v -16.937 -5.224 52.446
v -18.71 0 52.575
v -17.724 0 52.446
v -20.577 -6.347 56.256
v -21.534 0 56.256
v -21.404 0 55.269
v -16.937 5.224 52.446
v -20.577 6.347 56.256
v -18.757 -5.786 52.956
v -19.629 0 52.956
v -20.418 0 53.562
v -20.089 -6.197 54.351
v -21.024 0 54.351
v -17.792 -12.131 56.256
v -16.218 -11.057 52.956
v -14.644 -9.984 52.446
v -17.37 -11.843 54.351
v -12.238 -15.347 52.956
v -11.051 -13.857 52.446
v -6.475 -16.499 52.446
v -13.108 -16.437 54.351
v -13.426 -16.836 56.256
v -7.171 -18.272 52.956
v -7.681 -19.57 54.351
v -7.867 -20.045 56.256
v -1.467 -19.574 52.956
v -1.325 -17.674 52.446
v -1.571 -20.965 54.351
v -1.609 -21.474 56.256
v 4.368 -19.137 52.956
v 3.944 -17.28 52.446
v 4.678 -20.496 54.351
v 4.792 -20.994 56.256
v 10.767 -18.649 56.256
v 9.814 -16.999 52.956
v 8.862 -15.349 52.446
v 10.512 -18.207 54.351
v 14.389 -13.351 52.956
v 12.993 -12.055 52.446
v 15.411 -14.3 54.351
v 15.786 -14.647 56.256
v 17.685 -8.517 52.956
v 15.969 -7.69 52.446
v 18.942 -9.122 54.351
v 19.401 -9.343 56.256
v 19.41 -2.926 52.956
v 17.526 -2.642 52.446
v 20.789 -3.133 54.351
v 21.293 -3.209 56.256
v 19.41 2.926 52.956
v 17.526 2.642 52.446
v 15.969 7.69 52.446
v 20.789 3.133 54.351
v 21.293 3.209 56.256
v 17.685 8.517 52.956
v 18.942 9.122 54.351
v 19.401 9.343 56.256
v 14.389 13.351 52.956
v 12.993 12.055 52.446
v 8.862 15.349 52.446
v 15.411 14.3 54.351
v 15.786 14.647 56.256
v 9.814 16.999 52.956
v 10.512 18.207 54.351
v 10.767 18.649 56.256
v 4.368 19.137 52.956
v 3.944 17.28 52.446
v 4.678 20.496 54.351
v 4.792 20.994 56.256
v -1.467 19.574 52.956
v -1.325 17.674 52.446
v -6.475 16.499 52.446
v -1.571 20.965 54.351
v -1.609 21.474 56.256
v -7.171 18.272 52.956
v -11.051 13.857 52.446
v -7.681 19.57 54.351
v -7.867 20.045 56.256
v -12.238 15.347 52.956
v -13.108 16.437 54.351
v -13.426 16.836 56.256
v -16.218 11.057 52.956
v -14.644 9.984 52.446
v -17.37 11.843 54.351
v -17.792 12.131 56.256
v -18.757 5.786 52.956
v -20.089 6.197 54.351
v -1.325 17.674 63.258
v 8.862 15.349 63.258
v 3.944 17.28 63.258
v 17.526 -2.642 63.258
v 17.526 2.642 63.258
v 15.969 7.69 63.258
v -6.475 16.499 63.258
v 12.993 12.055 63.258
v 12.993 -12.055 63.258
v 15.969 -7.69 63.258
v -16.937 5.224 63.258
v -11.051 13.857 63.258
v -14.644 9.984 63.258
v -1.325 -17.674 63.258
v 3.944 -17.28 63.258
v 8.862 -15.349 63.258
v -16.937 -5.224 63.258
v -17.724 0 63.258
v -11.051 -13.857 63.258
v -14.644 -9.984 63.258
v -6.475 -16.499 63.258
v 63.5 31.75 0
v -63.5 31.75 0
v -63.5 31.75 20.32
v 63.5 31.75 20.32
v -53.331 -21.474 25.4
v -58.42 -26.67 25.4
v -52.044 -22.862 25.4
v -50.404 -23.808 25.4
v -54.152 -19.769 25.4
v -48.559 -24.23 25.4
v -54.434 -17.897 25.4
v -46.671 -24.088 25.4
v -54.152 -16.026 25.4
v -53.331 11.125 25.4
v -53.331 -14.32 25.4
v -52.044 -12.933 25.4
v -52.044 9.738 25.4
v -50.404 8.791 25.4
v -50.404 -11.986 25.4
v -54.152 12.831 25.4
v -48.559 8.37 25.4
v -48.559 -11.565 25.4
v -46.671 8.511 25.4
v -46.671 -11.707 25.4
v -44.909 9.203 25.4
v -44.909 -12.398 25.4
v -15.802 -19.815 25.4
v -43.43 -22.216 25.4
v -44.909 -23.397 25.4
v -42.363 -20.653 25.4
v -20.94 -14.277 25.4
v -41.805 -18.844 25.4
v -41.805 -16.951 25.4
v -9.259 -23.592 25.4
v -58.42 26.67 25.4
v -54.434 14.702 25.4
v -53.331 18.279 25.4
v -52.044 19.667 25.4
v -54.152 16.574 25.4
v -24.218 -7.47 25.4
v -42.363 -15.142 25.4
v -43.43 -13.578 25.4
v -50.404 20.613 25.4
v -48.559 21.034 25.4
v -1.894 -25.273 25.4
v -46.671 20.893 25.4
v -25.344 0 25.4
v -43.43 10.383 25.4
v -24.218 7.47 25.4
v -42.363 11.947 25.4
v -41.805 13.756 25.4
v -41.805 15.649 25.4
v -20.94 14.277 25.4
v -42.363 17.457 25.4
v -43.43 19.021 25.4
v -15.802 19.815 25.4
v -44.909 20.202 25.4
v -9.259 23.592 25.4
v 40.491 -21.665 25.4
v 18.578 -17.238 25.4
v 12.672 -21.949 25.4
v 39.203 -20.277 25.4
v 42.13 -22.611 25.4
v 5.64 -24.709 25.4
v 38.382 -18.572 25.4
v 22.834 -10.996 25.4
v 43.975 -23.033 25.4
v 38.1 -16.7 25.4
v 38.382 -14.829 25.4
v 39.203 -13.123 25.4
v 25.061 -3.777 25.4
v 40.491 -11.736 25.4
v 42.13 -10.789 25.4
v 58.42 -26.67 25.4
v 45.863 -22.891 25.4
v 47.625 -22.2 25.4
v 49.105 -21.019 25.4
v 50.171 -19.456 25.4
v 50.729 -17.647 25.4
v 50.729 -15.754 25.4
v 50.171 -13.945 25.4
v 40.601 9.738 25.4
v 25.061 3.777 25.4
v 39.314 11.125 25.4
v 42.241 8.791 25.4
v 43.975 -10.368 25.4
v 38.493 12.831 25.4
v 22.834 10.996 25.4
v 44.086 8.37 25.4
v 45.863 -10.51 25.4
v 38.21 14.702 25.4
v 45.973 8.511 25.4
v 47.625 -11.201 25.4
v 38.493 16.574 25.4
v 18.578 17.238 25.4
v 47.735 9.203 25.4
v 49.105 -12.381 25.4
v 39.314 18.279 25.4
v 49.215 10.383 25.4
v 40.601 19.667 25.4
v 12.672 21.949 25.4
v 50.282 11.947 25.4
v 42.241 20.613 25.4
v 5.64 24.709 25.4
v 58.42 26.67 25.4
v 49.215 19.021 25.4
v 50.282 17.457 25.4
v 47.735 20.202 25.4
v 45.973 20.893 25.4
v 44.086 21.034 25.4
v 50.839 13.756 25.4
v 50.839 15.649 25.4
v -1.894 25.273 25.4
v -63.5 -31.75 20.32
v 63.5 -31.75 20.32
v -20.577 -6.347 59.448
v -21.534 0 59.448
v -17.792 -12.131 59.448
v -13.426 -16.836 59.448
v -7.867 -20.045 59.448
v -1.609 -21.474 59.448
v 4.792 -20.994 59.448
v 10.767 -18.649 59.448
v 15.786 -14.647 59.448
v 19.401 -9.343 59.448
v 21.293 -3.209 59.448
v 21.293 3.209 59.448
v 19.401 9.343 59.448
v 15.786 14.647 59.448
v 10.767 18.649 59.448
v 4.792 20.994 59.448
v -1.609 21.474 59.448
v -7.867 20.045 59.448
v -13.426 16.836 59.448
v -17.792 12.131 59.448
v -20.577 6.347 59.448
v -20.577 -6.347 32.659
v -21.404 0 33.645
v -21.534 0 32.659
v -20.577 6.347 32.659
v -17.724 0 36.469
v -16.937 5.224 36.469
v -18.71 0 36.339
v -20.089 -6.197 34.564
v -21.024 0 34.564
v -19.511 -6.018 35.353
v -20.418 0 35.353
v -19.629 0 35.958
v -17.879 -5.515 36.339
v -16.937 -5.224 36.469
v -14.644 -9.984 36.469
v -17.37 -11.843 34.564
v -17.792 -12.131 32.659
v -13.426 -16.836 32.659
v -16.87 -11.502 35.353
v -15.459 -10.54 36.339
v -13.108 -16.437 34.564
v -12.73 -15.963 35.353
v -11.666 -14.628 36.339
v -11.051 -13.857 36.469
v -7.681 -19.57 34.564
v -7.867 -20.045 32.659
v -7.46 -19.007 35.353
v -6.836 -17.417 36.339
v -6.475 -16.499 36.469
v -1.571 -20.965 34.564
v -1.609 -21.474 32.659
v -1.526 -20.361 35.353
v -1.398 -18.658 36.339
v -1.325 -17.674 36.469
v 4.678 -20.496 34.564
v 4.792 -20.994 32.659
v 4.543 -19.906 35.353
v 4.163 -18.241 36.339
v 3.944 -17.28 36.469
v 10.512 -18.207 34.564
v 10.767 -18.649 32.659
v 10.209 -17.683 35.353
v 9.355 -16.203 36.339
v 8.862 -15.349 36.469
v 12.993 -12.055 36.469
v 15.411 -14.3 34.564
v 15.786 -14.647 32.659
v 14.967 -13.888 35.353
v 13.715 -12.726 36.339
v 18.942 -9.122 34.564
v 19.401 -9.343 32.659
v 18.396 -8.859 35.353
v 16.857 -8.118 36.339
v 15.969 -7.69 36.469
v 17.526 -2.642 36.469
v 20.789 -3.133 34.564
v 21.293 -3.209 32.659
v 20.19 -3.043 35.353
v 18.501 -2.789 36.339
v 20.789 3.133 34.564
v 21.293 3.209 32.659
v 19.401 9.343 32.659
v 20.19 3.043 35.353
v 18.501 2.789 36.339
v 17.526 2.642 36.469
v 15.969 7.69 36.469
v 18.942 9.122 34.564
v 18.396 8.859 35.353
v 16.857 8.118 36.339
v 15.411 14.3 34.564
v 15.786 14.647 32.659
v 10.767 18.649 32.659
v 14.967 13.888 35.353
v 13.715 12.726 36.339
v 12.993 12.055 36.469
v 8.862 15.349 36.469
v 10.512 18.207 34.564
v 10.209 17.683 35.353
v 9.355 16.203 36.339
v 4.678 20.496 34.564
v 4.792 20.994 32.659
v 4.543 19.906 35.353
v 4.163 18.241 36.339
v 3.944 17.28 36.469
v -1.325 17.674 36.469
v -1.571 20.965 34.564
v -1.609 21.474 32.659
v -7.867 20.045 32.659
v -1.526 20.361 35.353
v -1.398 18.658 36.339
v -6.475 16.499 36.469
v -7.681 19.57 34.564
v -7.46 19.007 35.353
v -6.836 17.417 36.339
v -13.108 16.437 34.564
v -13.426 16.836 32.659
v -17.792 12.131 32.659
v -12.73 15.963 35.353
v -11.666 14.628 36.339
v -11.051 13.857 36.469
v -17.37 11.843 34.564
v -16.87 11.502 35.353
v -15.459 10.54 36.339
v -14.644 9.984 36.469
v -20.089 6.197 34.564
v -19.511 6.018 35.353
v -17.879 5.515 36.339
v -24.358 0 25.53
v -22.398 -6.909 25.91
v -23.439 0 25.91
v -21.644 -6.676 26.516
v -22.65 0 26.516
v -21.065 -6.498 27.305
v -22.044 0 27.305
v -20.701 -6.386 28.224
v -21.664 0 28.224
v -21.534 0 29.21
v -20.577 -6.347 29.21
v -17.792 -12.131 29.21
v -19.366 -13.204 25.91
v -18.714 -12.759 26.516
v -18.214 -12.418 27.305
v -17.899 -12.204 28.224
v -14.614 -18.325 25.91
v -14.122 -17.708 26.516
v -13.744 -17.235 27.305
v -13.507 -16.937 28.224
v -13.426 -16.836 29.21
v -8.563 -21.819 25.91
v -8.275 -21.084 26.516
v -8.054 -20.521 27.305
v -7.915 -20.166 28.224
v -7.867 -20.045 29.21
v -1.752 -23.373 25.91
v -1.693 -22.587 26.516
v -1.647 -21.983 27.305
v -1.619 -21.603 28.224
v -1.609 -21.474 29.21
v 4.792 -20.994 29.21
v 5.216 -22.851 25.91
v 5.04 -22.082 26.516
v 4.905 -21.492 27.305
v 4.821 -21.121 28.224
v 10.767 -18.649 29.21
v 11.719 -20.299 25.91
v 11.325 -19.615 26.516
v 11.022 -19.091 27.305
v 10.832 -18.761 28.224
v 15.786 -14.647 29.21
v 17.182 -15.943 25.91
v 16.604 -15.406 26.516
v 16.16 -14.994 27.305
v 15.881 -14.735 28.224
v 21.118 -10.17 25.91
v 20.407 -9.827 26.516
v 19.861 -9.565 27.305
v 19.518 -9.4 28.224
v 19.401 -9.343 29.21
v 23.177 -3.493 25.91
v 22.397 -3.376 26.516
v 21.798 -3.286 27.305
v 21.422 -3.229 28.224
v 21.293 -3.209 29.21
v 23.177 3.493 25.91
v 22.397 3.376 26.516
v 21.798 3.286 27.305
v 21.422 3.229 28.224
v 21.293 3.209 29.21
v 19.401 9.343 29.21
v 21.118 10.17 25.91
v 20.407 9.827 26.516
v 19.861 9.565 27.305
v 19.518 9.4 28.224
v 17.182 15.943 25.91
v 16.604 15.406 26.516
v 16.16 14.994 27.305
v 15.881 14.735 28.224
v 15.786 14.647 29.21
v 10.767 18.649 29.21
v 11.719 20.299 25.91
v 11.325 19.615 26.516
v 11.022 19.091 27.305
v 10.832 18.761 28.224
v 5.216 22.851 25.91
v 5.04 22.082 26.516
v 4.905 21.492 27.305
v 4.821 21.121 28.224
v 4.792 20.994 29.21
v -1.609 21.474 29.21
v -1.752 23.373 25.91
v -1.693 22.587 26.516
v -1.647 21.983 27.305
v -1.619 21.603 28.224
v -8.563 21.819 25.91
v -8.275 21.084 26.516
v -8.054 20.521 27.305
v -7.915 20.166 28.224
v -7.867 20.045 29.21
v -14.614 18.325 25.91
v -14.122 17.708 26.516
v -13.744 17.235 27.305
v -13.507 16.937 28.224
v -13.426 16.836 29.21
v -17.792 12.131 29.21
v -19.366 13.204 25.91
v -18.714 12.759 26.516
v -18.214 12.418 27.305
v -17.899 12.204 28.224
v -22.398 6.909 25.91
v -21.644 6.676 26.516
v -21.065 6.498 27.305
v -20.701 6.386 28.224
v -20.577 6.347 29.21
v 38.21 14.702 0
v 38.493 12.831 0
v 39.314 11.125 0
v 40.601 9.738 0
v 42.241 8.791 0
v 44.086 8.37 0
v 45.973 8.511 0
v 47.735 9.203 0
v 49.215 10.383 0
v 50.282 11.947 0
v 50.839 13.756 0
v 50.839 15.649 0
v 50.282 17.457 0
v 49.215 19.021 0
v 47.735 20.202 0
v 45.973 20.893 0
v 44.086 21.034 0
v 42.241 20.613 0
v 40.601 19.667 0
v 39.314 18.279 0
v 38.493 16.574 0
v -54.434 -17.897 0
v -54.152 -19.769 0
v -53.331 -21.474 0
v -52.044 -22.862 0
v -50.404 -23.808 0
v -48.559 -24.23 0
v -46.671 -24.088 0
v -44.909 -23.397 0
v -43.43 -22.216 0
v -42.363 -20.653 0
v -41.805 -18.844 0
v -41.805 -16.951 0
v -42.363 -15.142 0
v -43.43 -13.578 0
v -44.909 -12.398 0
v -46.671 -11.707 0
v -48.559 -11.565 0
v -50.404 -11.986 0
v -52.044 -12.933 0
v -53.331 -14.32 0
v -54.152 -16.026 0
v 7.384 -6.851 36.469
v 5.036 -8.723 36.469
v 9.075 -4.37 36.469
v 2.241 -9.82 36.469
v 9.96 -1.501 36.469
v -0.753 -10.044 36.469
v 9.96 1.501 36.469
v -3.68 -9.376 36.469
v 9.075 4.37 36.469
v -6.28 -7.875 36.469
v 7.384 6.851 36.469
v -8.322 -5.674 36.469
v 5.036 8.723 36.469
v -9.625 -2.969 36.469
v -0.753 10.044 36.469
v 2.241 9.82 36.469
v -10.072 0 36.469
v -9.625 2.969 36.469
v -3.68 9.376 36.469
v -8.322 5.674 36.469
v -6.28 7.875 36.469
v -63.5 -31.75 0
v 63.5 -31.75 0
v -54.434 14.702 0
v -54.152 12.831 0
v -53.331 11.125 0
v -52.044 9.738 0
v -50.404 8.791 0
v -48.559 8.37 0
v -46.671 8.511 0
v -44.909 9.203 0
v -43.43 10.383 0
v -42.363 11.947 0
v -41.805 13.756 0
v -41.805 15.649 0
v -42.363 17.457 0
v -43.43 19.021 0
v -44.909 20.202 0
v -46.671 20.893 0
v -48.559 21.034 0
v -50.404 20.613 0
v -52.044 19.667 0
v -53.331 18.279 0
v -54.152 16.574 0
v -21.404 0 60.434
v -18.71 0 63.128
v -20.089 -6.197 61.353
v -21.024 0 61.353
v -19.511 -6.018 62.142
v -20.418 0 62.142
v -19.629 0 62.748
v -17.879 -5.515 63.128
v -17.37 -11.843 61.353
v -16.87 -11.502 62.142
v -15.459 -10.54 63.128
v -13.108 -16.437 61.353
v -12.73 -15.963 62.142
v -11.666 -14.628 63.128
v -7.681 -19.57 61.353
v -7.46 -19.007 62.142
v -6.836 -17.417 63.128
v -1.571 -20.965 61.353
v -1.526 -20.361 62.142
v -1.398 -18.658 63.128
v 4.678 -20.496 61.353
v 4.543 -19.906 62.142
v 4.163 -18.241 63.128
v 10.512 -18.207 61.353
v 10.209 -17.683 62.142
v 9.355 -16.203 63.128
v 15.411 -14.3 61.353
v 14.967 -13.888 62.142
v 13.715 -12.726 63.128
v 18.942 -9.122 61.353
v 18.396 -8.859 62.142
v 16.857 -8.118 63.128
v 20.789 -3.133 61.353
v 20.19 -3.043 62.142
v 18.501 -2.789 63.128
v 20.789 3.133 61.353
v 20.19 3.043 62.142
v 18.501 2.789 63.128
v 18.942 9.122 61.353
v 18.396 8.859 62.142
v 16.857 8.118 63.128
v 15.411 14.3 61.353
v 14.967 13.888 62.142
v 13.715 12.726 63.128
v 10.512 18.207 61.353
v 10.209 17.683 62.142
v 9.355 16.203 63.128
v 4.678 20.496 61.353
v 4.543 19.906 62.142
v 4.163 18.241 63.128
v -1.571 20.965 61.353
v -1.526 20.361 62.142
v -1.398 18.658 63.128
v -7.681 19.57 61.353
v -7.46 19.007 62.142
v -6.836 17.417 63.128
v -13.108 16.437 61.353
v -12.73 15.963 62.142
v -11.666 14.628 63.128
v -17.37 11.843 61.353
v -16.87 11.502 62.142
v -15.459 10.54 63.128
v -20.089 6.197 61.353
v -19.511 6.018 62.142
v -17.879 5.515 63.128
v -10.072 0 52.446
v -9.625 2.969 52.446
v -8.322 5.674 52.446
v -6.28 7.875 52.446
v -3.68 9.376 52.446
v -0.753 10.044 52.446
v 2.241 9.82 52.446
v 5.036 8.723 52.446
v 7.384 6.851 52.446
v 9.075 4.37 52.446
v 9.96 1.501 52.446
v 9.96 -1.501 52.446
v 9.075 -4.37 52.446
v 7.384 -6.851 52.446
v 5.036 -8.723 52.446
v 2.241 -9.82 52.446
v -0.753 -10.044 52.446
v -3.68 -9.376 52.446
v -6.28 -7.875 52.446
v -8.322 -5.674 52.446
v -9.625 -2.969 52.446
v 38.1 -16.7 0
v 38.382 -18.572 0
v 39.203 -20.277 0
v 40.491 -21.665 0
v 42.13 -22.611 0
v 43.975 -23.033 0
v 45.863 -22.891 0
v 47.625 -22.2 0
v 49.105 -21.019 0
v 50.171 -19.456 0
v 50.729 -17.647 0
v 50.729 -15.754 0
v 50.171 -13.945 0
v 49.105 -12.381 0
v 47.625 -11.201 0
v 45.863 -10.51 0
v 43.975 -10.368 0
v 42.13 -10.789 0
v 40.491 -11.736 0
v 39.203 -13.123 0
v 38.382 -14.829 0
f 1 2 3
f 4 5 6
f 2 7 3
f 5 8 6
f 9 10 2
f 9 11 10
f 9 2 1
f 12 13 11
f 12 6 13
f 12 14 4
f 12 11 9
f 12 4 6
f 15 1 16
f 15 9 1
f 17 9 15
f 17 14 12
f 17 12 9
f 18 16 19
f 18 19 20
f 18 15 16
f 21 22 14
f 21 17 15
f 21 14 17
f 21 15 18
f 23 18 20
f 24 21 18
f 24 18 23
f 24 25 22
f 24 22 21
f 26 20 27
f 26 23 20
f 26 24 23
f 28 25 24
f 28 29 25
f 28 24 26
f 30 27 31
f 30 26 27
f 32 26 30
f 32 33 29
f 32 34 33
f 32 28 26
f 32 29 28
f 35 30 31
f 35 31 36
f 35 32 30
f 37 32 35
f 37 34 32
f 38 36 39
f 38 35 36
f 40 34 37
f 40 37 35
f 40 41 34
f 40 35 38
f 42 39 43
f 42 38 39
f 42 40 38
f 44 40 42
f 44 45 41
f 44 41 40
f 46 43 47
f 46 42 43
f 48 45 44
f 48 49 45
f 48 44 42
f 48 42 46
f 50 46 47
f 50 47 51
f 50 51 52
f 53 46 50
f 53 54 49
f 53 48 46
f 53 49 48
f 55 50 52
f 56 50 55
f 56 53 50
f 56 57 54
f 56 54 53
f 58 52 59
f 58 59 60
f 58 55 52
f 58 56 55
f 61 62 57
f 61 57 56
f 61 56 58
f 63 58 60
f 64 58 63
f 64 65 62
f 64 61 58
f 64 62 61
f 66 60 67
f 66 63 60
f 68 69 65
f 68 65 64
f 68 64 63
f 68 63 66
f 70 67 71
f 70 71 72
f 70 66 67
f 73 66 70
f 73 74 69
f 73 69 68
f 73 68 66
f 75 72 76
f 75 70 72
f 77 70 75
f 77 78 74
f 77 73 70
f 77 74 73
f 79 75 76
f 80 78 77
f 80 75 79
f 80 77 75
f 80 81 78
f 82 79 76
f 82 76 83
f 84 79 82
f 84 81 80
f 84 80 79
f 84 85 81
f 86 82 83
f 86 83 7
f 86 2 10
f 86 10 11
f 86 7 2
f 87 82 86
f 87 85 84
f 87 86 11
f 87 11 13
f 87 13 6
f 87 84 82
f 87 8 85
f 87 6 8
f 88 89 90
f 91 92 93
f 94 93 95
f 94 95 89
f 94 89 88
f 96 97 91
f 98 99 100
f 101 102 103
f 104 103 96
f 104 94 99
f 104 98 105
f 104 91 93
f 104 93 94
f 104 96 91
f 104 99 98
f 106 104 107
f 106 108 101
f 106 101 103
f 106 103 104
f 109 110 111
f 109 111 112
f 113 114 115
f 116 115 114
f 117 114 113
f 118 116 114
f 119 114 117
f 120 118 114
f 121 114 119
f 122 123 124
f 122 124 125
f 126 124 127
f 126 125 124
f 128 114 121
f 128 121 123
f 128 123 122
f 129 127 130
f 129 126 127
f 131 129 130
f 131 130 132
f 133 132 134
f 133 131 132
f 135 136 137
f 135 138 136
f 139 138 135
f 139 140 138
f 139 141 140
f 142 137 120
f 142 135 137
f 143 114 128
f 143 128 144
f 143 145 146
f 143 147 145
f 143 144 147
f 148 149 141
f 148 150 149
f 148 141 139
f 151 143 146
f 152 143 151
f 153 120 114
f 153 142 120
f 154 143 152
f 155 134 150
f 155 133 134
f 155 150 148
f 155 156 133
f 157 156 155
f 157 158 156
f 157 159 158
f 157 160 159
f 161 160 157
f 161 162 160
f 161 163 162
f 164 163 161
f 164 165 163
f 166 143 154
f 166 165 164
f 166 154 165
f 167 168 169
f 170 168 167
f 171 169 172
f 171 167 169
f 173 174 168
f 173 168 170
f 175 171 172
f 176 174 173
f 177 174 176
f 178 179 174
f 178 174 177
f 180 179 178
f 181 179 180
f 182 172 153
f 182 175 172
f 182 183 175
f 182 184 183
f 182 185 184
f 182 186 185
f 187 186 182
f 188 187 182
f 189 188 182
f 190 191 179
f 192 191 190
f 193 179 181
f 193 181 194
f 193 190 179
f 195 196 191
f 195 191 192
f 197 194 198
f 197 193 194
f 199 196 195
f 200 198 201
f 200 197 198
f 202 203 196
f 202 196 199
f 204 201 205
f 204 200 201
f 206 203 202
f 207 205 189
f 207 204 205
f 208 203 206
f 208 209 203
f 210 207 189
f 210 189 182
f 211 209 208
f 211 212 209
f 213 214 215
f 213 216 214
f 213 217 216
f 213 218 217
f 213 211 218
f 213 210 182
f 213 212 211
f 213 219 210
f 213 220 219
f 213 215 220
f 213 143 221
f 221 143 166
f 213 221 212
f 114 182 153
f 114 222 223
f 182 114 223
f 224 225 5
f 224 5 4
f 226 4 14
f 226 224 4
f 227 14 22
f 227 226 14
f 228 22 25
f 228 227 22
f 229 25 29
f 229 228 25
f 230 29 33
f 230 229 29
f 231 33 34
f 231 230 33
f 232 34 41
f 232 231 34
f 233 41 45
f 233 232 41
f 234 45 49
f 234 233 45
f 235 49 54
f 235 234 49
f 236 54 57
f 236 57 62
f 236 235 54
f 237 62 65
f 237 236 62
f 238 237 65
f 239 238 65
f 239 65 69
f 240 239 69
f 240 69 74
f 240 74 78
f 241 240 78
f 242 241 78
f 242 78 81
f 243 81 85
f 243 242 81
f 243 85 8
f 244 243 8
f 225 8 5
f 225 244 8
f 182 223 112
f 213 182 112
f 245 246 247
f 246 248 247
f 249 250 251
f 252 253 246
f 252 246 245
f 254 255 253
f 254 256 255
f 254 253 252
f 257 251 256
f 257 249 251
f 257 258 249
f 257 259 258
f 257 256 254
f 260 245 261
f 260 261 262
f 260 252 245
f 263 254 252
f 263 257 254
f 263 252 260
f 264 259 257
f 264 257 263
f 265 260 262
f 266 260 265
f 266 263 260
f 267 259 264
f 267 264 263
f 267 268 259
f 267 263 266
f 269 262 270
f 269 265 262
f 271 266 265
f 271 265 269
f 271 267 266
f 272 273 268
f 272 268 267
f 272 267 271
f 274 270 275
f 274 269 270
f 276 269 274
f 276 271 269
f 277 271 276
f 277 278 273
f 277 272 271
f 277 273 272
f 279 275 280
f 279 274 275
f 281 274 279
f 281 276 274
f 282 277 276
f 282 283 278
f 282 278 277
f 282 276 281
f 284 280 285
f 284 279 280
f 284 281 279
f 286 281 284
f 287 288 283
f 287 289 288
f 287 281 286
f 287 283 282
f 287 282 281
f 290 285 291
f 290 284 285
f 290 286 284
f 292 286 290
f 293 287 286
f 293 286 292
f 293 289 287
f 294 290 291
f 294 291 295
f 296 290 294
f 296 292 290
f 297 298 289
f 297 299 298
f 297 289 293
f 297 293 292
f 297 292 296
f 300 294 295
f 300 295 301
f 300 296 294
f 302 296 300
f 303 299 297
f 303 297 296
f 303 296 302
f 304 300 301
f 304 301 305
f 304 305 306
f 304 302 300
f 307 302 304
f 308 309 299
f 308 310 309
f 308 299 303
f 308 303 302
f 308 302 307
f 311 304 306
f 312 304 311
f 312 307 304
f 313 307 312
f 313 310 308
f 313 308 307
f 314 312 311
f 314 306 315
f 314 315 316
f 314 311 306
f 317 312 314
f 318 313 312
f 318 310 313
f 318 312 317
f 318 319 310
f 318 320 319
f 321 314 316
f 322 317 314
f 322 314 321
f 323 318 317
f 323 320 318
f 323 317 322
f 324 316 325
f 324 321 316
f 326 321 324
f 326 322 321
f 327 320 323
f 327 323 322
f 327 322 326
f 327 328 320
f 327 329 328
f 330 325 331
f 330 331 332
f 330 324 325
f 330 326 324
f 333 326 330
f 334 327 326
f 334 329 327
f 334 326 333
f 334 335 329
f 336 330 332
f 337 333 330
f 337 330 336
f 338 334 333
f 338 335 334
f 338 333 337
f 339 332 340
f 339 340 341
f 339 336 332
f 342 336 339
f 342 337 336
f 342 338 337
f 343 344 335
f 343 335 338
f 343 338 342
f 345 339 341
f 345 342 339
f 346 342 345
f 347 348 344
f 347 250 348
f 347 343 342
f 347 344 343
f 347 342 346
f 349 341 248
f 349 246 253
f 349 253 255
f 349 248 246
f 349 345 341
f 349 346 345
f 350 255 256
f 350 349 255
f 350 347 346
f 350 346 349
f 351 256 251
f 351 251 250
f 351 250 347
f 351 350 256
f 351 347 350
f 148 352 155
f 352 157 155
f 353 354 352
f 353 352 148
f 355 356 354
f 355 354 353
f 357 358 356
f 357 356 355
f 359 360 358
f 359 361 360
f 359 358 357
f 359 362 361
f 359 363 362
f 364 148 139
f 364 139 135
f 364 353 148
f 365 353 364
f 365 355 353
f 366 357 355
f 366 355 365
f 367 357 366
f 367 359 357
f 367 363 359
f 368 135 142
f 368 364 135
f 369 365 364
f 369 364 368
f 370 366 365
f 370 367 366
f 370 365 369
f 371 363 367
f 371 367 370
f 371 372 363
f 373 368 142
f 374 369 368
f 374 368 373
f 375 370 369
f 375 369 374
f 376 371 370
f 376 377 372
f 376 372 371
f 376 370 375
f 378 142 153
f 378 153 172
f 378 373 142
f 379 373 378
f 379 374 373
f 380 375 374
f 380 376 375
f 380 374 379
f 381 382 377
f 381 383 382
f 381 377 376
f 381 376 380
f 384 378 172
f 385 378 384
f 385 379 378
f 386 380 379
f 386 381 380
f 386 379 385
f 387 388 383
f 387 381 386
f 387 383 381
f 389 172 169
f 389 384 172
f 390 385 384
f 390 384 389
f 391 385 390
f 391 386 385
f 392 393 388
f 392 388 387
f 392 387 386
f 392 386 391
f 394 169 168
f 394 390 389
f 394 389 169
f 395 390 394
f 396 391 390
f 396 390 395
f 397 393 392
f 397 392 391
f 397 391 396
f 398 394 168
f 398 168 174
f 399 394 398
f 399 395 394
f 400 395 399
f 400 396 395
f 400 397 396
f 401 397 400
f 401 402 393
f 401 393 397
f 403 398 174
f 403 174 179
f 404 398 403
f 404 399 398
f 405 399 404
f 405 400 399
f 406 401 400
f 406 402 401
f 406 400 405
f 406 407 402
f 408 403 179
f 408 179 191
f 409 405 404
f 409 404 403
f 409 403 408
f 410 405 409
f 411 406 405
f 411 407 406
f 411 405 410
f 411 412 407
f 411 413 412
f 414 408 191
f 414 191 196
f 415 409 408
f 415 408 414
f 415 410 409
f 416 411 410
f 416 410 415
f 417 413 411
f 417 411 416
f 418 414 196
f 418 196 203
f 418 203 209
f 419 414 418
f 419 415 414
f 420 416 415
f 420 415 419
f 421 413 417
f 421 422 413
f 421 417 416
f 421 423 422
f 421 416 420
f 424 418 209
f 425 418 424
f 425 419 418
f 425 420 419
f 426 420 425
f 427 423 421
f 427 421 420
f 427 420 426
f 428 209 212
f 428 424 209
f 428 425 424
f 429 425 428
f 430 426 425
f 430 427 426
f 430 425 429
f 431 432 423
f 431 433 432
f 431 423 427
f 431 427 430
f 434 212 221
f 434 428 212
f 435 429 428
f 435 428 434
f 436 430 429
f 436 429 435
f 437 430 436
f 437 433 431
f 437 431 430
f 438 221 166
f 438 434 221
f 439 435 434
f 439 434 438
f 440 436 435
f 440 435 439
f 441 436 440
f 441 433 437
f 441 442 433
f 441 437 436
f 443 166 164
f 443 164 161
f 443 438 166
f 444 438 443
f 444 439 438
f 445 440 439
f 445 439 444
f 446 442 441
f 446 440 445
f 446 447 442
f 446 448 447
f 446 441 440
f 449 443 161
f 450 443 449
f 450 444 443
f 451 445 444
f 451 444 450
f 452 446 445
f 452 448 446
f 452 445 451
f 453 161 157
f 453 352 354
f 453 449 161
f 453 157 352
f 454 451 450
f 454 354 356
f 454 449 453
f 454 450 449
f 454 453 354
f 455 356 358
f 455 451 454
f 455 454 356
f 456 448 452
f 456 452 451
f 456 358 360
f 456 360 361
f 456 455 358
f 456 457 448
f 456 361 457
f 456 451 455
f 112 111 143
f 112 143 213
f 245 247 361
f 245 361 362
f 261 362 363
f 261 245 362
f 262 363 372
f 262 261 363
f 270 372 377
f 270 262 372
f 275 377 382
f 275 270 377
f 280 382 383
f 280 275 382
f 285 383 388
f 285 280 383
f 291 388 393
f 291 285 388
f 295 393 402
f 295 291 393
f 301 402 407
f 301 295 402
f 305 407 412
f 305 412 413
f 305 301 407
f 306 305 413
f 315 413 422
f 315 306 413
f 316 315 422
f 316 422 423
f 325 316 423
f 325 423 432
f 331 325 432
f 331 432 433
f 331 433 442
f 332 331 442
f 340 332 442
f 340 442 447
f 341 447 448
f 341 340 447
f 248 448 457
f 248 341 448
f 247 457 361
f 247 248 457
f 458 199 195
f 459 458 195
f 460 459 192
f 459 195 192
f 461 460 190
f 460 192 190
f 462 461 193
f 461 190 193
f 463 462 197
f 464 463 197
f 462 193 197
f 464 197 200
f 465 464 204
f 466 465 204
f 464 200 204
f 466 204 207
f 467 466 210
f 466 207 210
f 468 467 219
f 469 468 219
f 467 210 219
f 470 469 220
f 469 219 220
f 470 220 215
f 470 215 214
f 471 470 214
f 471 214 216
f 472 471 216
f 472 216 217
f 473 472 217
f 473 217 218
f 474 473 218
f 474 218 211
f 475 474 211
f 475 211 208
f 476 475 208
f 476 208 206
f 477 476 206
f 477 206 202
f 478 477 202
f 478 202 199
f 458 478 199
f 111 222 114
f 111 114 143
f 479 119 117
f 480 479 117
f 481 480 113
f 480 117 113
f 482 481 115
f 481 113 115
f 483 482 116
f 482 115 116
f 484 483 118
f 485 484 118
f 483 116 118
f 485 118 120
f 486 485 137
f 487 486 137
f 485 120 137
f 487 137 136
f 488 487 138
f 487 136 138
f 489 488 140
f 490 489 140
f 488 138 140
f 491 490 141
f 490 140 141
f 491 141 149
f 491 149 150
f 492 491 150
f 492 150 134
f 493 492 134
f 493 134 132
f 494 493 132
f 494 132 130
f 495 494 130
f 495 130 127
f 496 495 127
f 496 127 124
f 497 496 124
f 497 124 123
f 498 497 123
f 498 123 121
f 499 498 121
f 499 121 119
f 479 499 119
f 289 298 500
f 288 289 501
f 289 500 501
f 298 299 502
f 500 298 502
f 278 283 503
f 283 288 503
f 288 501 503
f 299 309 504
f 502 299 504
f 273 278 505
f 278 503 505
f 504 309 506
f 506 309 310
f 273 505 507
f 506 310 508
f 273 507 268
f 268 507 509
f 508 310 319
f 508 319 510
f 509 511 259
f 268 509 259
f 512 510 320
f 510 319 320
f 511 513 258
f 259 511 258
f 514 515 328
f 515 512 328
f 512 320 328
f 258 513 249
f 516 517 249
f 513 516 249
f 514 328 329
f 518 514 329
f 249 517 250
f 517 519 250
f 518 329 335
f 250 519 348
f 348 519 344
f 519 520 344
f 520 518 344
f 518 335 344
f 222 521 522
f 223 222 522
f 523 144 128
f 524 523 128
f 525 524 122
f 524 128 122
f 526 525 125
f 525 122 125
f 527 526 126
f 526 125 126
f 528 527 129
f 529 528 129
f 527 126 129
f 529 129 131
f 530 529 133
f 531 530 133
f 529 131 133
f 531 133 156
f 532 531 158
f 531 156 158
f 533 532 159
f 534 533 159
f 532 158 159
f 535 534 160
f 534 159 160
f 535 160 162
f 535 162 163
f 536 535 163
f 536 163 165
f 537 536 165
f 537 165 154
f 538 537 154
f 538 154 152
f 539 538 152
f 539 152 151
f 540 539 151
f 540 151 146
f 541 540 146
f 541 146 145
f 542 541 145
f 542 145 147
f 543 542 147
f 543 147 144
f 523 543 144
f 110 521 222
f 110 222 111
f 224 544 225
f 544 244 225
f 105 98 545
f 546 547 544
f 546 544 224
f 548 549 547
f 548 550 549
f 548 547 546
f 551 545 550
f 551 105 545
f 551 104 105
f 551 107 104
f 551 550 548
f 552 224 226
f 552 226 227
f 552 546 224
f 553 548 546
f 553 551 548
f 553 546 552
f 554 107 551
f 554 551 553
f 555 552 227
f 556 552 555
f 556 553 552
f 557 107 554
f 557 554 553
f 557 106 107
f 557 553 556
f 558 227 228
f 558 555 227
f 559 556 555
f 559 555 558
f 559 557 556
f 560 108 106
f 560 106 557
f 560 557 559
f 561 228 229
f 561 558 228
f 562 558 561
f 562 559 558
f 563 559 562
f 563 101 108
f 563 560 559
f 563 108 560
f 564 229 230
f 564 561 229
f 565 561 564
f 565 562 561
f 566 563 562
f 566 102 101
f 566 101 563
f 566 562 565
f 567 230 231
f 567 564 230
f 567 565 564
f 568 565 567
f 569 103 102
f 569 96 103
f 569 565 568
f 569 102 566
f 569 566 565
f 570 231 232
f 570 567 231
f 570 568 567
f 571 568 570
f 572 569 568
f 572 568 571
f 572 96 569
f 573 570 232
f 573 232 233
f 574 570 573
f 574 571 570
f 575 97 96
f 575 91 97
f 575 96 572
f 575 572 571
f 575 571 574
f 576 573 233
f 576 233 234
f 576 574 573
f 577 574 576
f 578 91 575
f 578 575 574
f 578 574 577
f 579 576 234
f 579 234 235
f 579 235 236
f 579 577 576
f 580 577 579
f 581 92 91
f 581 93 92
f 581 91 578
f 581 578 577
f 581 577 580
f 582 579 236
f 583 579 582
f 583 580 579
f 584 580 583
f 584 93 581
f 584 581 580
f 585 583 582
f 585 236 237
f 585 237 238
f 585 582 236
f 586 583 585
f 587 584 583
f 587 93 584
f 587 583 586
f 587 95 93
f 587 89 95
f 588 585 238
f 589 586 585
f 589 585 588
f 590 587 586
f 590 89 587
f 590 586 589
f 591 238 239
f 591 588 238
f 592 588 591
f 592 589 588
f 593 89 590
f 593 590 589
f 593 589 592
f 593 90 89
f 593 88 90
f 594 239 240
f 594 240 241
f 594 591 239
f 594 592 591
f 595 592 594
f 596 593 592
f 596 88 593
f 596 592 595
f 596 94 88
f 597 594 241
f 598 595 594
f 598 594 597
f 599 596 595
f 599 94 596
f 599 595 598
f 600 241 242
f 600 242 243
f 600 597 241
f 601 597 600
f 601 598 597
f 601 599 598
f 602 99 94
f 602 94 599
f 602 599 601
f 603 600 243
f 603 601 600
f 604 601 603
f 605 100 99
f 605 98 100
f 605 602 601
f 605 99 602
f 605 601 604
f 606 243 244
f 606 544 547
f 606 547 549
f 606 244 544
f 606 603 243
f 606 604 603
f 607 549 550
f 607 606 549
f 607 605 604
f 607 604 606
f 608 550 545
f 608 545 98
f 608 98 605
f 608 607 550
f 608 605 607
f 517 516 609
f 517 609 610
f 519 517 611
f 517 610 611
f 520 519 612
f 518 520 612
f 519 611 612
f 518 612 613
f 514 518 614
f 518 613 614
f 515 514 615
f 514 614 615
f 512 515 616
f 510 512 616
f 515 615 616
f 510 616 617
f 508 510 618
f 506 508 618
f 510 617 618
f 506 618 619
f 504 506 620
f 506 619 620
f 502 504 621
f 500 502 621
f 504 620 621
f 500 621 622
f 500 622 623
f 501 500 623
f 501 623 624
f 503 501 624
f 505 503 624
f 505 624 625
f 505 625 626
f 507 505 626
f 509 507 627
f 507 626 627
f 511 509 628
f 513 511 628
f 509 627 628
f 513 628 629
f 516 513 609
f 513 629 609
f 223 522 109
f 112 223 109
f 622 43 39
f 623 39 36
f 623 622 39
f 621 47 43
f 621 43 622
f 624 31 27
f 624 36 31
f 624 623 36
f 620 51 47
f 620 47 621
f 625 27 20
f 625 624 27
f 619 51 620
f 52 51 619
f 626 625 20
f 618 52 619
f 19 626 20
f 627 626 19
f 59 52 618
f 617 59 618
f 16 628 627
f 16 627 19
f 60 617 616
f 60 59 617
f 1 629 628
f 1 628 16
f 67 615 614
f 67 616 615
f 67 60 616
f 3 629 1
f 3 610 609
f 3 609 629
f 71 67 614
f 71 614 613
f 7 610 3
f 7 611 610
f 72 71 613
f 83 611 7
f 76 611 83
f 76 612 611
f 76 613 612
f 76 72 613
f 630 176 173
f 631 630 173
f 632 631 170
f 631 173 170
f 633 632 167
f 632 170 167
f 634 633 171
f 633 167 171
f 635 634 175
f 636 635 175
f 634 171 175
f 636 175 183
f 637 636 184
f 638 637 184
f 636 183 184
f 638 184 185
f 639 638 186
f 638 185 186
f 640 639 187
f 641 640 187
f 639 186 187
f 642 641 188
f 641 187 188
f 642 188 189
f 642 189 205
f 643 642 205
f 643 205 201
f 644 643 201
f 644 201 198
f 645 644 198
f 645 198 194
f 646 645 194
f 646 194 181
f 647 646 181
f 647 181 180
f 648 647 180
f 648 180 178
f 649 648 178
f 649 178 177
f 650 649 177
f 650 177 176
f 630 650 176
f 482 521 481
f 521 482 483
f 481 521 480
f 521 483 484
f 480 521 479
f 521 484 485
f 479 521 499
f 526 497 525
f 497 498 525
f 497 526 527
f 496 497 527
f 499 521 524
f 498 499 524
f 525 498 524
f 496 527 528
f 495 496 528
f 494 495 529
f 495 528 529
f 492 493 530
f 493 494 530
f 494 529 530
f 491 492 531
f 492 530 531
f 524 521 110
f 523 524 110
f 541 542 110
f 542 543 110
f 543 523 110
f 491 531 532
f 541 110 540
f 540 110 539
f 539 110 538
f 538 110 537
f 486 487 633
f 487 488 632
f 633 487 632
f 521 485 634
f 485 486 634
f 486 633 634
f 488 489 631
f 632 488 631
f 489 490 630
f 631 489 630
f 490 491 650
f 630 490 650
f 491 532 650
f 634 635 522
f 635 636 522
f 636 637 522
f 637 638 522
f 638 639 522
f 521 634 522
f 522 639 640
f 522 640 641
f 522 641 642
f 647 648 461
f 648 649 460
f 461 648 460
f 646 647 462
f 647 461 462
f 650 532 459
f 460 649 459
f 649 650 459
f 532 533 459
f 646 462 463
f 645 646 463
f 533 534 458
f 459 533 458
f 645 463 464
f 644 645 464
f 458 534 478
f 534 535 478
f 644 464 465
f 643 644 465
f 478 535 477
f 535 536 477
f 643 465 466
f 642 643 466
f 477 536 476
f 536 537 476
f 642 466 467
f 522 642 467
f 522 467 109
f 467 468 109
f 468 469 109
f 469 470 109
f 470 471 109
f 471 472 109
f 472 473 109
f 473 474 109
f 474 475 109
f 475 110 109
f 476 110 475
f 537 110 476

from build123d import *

# Parameters (mm, degrees)
F0_W     = 127
F0_H     = 63.5
F1_DEPTH = 25.4
F3_D     = 12.7
F4_W     = 21.5339493006
F4_H     = 37.8580782562
F6_W     = 15.2821568772
F6_H     = 15.9768015146
F8_R     = 3.81
F9_SIZE  = 5.08


with BuildPart() as f1:
    # F0 (on Top) → F1 (new body)
    with BuildSketch(Plane.XY):
        Rectangle(F0_W, F0_H)
    extrude(amount=F1_DEPTH)

    # F3 (through all)
    with Locations(Plane(origin=(0, 0, 0), x_dir=(1, 0, 0), z_dir=(0, 0, -1))):
        with Locations((-48.0844858662, -14.7022493572), (-48.0844858662, 17.8973527858), (44.45, 16.7003627867), (44.5604218255, -14.7022493572)):
            Hole(F3_D / 2)

    # F4 (on Front) → F5 (revolve)
    with BuildSketch(Plane.XZ):
        with Locations((-10.7669746503, 44.3290391281)):
            Rectangle(F4_W, F4_H)
    revolve(axis=Axis((0, 0, 44.3290391281), (0, 0, 1)))

    # F6 (on Front) → F7 (revolve, cut)
    with BuildSketch(Plane.XZ):
        with Locations((-17.7134093828, 44.4571860135)):
            Rectangle(F6_W, F6_H)
    revolve(axis=Axis((0, 0, 63.2580782562), (0, 0, -1)), mode=Mode.SUBTRACT)

    # F8
    f8_edges = [f1.edges().sort_by_distance(p)[0] for p in [
        (21.533949, 0, 63.258078),
        (21.533949, 0, 36.468785),
        (21.533949, 0, 25.4),
        (21.533949, 0, 52.445587),
    ]]
    fillet(f8_edges, radius=F8_R)

    # F9
    f9_edges = [f1.edges().sort_by_distance(p)[0] for p in [
        (0, 31.75, 25.4),
        (-63.5, 0, 25.4),
        (0, -31.75, 25.4),
        (63.5, 0, 25.4),
    ]]
    chamfer(f9_edges, length=F9_SIZE)


solid = f1.part
